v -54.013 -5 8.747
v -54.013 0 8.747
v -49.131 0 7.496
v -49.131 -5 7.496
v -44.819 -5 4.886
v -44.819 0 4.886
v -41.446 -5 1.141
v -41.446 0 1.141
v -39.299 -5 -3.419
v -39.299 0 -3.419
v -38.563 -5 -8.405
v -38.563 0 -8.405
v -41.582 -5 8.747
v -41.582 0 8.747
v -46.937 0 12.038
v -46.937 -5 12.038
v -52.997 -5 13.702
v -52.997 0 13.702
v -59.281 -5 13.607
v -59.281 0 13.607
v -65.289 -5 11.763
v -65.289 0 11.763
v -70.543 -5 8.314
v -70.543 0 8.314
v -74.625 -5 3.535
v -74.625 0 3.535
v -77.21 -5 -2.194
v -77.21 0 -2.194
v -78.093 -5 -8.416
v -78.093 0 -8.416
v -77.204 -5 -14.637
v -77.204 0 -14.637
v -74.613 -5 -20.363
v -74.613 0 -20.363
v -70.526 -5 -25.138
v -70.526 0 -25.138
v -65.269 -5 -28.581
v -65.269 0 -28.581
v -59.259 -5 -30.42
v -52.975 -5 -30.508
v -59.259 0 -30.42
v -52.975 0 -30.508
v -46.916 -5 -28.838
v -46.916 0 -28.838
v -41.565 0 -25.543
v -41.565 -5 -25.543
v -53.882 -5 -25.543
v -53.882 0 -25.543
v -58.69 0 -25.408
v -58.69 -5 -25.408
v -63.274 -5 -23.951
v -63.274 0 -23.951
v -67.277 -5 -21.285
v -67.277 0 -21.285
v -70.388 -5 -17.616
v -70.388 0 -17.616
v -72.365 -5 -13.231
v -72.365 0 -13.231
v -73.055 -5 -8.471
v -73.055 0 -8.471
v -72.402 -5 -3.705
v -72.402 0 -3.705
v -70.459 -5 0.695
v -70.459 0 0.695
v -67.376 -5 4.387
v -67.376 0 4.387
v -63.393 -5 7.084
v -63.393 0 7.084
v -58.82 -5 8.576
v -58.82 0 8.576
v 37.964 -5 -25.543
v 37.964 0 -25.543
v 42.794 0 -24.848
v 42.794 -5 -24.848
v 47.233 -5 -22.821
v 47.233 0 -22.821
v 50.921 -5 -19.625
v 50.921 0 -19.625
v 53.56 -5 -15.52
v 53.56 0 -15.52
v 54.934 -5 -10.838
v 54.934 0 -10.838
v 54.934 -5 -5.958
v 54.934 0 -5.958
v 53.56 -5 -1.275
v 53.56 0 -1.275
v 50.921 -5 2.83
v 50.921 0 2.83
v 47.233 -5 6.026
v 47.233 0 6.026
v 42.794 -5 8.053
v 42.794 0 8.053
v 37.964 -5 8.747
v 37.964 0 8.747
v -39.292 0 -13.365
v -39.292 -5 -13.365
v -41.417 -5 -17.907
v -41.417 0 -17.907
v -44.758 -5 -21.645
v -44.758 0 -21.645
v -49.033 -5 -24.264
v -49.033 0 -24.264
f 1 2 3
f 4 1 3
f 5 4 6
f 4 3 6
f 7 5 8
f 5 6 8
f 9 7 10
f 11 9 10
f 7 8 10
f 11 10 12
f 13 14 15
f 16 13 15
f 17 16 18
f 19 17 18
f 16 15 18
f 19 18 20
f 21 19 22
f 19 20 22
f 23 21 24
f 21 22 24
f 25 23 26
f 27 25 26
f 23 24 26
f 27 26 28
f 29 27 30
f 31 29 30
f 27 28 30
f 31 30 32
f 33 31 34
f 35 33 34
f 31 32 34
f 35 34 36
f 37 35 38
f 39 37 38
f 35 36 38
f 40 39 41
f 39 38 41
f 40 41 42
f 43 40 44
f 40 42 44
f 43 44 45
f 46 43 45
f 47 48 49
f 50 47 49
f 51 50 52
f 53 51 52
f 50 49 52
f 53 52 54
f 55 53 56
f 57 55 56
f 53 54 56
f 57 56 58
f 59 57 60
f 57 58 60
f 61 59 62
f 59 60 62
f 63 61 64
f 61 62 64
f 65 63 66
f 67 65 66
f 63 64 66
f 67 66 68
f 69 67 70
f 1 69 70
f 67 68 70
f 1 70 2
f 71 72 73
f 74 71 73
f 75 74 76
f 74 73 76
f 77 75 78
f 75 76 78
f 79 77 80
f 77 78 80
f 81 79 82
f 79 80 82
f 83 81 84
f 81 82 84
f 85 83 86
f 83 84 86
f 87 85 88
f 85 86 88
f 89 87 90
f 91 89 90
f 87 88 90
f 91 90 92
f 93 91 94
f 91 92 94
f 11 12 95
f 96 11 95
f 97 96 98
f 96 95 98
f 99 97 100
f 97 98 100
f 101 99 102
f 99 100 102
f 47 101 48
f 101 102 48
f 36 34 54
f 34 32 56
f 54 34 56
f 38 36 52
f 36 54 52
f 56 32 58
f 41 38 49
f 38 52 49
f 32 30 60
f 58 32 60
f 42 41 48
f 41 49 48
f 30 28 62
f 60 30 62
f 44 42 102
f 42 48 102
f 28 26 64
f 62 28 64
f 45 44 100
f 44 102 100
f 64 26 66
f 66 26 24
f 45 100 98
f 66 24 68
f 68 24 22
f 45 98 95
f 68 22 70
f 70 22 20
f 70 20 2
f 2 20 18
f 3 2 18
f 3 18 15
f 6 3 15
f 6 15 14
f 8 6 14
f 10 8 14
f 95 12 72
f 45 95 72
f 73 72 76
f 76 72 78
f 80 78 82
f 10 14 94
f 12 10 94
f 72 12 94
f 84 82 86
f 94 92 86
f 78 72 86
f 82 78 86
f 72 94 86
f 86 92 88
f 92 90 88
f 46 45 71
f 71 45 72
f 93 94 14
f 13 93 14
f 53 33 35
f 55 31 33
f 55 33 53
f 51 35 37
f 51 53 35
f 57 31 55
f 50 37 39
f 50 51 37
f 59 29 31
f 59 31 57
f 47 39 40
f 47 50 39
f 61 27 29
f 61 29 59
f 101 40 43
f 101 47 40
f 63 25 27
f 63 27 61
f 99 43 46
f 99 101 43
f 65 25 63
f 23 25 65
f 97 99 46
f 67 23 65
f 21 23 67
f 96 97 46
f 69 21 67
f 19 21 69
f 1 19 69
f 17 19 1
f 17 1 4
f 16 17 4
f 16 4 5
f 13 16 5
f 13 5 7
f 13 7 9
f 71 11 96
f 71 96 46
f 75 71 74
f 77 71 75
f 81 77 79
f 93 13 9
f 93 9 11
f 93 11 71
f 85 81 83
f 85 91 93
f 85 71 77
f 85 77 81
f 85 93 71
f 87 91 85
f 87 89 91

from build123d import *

# Parameters (mm, degrees)
F1_DEPTH = 5


# Not quite as in the source:
# - the program builds the solid bodies; features that only make, move or delete a surface that nothing else refers to are left out


with BuildPart() as f1:
    # F0 (on Front) → F1 (new body)
    with BuildSketch(Plane.XZ):
        with BuildLine():
            ThreePointArc((-38.5628677204, -8.4046955637), (-42.950748766, -19.8978357544), (-53.8815692168, -25.542562124))
            Line((-53.8815692168, -25.542562124), (-41.5648788357, -25.542562124))
            ThreePointArc((-41.5648788357, -25.542562124), (-35.6343803196, -17.869848935), (-33.5243537826, -8.4046955637))
            ThreePointArc((-33.5243537826, -8.4046955637), (-35.6391308825, 1.0705767284), (-41.5820798093, 8.7474527367))
            Line((-41.5820798093, 8.7474527367), (-54.0131150031, 8.7474527367))
            ThreePointArc((-54.0131150031, 8.7474527367), (-42.9949338553, 3.137686474), (-38.5628677204, -8.4046955637))
        make_face()
        with BuildLine():
            Line((-41.5648788357, -25.542562124), (-53.8815692168, -25.542562124))
            ThreePointArc((-53.8815692168, -25.542562124), (-73.0545080153, -8.4708549583), (-54.0131150031, 8.7474527367))
            Line((-54.0131150031, 8.7474527367), (-41.5820798093, 8.7474527367))
            ThreePointArc((-41.5820798093, 8.7474527367), (-78.0931460515, -8.4158741323), (-41.5648788357, -25.542562124))
        make_face()
        with BuildLine():
            ThreePointArc((-33.5243537826, -8.4046955637), (-35.6343803196, -17.869848935), (-41.5648788357, -25.542562124))
            Line((-41.5648788357, -25.542562124), (37.9639441457, -25.542562124))
            ThreePointArc((37.9639441457, -25.542562124), (55.1089515761, -8.3975546937), (37.9639441457, 8.7474527367))
            Line((37.9639441457, 8.7474527367), (-41.5820798093, 8.7474527367))
            ThreePointArc((-41.5820798093, 8.7474527367), (-35.6391308825, 1.0705767284), (-33.5243537826, -8.4046955637))
        make_face()
        with BuildLine():
            Line((37.9639441457, -20.3371653928), (37.9639441457, -17.8371653928))
            ThreePointArc((37.9639441457, -17.8371653928), (44.7629027111, -8.9185826964), (37.9639441457, 0))
            Line((37.9639441457, 0), (37.9639441457, 2.5))
            ThreePointArc((37.9639441457, 2.5), (48.2332452633, -8.9185826964), (37.9639441457, -20.3371653928))
        make_face(mode=Mode.SUBTRACT)
        with BuildLine():
            ThreePointArc((37.9639441457, 0), (44.7629027111, -8.9185826964), (37.9639441457, -17.8371653928))
            Line((37.9639441457, -17.8371653928), (37.9639441457, -20.3371653928))
            ThreePointArc((37.9639441457, -20.3371653928), (48.2332452633, -8.9185826964), (37.9639441457, 2.5))
            Line((37.9639441457, 2.5), (37.9639441457, 0))
        make_face()
    extrude(amount=F1_DEPTH)


solid = f1.part
